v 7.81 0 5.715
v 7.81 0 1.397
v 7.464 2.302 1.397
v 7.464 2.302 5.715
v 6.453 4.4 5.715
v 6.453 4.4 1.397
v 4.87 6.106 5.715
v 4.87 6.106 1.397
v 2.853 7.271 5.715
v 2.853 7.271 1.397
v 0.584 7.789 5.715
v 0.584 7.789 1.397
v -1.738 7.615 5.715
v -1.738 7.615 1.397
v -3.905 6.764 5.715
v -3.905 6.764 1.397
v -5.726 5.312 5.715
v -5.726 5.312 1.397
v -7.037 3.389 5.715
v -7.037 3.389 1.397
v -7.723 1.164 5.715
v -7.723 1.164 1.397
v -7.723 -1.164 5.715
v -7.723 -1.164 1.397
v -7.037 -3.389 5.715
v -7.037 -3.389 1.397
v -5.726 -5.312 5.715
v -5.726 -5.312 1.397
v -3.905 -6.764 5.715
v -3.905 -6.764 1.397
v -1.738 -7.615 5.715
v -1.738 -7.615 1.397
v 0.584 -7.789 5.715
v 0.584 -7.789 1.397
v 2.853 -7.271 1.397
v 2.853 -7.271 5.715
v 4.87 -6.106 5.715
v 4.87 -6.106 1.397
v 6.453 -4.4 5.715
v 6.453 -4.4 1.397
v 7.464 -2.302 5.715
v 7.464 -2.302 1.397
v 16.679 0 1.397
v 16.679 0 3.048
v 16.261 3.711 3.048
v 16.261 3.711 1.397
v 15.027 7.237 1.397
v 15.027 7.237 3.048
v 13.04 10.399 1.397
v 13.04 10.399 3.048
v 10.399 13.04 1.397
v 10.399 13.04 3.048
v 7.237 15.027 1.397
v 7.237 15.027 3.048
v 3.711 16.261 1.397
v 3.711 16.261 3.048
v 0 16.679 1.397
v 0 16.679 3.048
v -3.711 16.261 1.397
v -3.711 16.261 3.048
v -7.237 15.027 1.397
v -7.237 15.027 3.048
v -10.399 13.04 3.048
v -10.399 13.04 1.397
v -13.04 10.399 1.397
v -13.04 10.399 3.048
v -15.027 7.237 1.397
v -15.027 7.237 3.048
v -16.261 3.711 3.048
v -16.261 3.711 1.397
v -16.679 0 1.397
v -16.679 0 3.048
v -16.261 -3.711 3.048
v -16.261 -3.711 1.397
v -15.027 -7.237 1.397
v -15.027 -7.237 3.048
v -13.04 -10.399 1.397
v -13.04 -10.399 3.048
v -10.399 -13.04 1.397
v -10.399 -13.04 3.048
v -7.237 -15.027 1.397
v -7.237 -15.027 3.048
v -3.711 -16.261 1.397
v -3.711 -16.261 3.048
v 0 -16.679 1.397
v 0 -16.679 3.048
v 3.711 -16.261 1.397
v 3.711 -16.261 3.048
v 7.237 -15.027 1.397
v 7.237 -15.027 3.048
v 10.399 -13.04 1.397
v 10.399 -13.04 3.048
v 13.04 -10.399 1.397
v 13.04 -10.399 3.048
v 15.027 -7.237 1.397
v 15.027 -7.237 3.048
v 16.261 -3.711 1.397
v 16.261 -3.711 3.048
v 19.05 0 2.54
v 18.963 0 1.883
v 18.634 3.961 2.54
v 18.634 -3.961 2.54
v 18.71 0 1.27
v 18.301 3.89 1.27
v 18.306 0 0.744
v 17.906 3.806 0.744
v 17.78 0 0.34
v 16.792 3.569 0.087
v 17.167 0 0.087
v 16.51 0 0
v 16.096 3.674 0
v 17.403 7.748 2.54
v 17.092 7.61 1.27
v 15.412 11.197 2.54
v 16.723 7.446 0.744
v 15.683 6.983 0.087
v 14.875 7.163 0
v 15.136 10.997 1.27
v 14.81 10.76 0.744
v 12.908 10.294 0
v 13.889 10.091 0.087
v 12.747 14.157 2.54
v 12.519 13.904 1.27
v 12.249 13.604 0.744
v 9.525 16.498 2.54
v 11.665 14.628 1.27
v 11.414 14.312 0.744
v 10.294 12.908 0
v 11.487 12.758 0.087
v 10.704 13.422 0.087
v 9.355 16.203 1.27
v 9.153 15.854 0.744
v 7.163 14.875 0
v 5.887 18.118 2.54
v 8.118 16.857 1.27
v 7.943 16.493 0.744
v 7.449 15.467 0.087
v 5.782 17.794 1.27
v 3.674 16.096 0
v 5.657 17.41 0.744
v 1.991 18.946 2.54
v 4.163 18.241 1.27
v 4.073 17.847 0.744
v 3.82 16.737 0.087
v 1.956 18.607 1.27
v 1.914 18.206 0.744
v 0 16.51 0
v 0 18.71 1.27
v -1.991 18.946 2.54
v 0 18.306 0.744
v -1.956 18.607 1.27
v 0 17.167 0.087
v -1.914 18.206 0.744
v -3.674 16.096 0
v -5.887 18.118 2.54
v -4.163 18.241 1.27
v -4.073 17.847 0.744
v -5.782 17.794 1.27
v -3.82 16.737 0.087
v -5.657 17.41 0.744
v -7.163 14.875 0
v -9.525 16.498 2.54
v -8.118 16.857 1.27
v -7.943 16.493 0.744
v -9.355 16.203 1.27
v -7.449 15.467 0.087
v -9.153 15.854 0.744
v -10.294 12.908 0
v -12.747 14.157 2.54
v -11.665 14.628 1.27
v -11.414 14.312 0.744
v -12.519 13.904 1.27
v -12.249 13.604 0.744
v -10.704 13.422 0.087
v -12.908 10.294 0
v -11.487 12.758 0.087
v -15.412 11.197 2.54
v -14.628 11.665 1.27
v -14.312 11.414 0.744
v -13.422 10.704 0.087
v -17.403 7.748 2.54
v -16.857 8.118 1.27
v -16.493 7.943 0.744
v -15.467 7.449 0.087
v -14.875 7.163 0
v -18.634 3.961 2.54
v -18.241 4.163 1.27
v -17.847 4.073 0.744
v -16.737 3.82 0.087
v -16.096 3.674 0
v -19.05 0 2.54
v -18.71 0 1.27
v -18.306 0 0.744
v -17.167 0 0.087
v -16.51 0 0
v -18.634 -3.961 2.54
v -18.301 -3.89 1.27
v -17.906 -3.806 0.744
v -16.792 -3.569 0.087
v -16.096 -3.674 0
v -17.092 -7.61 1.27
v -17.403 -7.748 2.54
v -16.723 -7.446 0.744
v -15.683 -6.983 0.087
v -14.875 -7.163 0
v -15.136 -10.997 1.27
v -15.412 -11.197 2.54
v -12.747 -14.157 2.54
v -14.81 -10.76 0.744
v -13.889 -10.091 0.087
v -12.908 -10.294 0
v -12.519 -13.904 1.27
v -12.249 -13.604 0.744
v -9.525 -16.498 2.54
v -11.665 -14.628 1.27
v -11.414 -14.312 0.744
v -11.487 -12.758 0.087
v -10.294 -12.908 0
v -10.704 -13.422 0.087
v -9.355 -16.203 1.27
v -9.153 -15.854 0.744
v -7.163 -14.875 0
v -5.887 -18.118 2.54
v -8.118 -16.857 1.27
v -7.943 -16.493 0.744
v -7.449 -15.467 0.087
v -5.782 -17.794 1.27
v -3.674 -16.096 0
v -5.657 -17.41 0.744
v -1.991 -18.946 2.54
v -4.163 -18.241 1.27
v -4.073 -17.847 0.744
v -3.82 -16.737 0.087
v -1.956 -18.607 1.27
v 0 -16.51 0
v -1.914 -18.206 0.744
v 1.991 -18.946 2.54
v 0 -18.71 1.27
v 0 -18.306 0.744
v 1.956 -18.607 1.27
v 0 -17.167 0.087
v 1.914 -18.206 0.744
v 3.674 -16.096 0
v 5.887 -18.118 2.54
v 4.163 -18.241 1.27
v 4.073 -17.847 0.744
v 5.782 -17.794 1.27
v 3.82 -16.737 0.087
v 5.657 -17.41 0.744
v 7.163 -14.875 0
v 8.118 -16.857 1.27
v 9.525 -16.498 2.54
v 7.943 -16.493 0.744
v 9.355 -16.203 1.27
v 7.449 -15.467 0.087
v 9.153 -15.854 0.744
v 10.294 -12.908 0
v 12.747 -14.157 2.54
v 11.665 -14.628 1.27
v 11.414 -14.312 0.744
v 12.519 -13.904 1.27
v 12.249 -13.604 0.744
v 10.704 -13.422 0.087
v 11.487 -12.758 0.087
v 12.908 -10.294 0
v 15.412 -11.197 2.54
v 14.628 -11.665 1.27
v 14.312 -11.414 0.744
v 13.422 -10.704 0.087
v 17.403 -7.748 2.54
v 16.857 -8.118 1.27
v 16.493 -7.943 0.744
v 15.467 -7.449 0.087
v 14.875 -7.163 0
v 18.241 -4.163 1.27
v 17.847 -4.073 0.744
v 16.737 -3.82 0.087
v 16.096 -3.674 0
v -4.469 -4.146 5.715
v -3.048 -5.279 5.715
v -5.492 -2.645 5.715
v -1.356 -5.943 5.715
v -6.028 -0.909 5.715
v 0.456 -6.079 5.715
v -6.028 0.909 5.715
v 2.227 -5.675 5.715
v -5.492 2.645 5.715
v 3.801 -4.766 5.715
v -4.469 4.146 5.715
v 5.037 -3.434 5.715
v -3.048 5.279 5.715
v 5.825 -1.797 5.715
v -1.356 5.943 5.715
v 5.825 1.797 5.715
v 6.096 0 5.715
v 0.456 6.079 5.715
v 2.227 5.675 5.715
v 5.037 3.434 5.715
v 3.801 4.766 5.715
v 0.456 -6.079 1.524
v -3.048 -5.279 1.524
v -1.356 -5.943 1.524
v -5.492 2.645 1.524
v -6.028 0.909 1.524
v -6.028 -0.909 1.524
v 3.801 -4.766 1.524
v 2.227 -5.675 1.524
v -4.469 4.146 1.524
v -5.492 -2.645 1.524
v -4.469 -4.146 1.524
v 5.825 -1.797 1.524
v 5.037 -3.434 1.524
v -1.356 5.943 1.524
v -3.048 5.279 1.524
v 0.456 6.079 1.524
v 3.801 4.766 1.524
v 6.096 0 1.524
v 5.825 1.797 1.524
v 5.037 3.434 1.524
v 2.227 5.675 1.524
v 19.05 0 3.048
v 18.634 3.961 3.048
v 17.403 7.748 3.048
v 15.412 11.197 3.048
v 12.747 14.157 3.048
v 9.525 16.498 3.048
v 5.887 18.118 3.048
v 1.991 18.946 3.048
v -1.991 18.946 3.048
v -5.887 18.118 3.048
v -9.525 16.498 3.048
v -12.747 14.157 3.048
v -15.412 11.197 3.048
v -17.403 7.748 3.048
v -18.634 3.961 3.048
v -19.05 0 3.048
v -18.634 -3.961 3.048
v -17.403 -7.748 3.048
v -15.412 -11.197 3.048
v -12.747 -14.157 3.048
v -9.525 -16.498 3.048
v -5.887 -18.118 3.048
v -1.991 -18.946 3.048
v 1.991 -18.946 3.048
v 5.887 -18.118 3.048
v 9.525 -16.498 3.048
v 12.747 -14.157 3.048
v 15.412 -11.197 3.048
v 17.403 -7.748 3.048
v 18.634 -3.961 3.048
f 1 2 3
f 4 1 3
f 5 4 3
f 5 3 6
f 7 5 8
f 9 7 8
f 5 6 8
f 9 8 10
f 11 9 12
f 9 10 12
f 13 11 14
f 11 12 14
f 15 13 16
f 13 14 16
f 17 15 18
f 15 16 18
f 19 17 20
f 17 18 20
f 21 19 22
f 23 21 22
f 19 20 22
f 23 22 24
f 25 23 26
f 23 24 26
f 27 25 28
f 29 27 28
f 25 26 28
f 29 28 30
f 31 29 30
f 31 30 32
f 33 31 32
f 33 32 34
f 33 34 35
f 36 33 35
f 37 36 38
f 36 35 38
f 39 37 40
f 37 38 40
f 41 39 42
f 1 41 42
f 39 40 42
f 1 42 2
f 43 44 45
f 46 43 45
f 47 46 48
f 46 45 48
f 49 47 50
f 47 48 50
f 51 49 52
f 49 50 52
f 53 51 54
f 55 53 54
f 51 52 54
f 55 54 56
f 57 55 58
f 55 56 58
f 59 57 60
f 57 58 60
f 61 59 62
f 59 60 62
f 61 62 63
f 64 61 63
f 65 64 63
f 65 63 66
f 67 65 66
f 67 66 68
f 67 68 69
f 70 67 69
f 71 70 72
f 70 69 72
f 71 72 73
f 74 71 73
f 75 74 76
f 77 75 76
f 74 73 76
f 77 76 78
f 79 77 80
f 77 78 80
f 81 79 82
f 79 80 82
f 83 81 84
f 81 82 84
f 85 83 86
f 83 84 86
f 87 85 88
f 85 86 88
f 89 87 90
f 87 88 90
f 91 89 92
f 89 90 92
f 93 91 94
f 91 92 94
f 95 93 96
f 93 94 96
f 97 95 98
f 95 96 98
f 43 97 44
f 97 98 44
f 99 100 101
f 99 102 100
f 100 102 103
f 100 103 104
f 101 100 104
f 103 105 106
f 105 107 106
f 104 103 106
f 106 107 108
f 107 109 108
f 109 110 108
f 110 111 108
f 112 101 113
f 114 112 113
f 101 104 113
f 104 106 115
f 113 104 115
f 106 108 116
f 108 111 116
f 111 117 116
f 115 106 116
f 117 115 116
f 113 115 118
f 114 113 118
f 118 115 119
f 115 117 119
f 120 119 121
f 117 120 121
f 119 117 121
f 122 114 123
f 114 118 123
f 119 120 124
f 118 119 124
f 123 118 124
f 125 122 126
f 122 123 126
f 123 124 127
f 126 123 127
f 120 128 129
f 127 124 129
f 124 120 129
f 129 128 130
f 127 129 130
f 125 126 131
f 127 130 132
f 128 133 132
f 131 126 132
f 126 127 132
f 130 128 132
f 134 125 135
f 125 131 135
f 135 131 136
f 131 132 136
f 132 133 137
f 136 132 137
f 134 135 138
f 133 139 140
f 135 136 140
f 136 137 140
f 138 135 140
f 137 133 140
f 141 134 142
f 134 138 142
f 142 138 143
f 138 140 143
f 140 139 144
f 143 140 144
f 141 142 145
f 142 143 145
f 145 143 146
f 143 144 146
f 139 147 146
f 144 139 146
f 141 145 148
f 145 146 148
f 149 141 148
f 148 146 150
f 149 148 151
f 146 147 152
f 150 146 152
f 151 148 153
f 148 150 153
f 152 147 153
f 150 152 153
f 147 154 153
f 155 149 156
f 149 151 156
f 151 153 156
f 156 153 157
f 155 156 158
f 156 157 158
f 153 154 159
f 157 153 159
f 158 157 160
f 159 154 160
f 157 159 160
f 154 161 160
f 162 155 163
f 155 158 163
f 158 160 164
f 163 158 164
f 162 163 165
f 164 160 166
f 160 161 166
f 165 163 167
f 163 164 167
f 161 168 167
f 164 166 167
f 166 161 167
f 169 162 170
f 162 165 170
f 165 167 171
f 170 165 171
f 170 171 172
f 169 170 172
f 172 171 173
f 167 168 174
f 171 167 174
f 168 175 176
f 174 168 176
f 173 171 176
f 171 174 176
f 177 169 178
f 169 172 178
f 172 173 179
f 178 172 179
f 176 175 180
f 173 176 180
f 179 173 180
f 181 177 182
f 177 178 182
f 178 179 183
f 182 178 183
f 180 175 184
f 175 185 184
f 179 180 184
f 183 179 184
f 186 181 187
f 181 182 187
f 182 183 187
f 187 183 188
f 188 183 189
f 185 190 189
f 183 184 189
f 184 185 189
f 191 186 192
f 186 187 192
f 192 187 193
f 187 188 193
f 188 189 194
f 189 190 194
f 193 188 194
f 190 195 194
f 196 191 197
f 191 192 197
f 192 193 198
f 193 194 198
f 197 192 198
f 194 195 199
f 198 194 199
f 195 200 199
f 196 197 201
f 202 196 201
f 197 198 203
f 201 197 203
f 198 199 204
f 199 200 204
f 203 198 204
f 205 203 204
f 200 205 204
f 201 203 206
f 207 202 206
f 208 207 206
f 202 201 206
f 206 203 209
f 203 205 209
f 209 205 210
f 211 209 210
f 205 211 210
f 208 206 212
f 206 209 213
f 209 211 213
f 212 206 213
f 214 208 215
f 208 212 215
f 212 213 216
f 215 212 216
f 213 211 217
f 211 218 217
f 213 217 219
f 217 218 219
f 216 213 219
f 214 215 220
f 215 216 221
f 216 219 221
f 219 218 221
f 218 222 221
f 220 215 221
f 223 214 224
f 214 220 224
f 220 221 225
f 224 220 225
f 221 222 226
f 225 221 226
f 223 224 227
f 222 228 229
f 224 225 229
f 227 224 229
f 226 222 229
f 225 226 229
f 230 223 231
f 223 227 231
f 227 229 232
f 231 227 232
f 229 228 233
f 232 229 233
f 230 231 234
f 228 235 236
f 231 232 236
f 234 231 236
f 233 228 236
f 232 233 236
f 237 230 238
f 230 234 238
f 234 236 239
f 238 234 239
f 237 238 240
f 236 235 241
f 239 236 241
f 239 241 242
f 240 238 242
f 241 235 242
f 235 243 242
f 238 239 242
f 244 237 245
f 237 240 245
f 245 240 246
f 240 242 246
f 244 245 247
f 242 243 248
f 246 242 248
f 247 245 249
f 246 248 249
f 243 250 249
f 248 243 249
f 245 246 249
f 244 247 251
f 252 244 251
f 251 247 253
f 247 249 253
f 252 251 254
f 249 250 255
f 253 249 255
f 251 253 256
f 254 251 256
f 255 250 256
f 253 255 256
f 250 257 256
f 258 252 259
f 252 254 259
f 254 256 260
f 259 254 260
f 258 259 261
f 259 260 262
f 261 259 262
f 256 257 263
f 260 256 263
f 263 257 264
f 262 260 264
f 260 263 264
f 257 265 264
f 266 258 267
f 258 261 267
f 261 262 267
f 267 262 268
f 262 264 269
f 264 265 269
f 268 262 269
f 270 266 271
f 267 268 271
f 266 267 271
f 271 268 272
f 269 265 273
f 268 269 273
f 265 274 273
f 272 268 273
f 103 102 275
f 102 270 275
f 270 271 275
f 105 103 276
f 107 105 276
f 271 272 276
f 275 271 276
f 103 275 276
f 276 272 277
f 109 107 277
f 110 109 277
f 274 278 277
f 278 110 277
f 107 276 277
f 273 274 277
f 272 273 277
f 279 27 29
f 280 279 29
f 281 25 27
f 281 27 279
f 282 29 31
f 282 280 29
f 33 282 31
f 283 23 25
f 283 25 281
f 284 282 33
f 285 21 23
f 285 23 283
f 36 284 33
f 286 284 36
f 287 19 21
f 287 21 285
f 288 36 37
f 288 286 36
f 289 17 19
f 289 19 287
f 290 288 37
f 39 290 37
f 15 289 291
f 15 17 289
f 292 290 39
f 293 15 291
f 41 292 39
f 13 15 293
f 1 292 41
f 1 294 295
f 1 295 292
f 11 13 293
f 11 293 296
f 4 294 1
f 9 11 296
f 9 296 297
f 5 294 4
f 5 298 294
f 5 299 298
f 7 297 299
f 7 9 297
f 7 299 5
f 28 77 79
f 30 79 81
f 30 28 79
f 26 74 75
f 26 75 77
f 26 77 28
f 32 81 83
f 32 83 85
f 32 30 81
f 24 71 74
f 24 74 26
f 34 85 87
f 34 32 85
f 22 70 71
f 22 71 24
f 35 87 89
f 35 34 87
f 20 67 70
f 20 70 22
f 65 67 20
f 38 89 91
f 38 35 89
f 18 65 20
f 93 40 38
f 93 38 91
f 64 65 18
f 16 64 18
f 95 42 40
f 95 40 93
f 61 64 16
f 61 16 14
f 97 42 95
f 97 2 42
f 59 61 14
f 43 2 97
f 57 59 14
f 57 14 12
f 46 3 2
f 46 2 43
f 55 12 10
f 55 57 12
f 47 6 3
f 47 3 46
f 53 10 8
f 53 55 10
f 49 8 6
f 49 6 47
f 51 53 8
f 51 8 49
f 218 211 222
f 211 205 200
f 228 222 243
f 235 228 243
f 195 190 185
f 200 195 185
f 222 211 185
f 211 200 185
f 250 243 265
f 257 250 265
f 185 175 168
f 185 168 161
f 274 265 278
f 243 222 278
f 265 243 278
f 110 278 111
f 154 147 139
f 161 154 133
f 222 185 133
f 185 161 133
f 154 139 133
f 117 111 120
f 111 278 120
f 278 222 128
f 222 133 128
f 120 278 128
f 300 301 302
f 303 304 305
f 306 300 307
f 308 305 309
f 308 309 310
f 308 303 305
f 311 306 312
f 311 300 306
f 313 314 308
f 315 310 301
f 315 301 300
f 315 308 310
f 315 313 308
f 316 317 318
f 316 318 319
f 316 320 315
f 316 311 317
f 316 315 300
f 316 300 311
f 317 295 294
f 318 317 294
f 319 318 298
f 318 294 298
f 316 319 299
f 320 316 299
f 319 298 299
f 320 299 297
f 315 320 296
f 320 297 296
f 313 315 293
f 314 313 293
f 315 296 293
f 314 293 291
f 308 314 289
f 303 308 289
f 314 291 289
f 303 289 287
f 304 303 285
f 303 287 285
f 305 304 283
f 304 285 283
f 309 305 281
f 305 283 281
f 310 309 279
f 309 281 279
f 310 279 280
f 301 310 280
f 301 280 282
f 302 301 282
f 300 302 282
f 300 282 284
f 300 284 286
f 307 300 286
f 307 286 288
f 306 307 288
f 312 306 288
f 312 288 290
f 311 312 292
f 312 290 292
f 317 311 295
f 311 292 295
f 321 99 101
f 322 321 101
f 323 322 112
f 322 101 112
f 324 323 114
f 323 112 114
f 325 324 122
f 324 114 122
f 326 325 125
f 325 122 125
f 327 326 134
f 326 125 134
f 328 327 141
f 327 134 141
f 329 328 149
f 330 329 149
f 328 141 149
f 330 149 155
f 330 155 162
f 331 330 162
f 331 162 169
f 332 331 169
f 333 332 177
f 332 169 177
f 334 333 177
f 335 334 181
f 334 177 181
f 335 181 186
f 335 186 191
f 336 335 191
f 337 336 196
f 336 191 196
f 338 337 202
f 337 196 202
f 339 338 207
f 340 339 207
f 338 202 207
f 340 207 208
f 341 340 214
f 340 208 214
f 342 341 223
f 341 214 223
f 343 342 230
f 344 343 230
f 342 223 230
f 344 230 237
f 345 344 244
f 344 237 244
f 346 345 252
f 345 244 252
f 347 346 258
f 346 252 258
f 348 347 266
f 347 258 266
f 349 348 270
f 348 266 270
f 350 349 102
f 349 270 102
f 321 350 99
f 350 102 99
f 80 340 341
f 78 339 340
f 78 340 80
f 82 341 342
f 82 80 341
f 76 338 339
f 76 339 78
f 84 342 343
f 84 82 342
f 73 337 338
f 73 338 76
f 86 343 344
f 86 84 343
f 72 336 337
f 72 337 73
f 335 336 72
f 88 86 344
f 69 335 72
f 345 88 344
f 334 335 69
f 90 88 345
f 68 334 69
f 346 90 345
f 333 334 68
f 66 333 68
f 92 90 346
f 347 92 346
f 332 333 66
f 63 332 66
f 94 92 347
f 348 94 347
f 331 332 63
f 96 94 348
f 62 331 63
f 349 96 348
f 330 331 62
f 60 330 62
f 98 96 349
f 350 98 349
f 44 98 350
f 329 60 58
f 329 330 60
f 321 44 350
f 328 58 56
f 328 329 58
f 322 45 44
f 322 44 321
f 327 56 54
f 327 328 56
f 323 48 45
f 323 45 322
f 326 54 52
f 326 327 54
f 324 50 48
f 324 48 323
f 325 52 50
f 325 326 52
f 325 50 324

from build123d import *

# Parameters (mm, degrees)
F0_R     = 19.05
F1_DEPTH = 3.048
F2_R     = 2.54
F3_R     = 16.678994
F4_DEPTH = 1.651
F5_R     = 7.8105
F6_DEPTH = 4.318
F7_R     = 6.096
F8_DEPTH = 4.191


with BuildPart() as f1:
    # F0 (on Top) → F1 (new body)
    with BuildSketch(Plane.XY):
        Circle(F0_R)
    extrude(amount=F1_DEPTH)

    # F2
    f2_edges = [f1.edges().sort_by_distance(p)[0] for p in [
        (-19.05, 0, 0),
    ]]
    fillet(f2_edges, radius=F2_R)

    # F3 (on face) → F4 (cut)
    with BuildSketch(Plane.XY.offset(3.048)):
        Circle(F3_R)
    extrude(amount=-F4_DEPTH, mode=Mode.SUBTRACT)

    # F5 (on face) → F6 (join)
    with BuildSketch(Plane.XY.offset(1.397)):
        Circle(F5_R)
    extrude(amount=F6_DEPTH)

    # F7 (on face) → F8 (cut)
    with BuildSketch(Plane.XY.offset(5.715)):
        Circle(F7_R)
    extrude(amount=-F8_DEPTH, mode=Mode.SUBTRACT)


solid = f1.part
